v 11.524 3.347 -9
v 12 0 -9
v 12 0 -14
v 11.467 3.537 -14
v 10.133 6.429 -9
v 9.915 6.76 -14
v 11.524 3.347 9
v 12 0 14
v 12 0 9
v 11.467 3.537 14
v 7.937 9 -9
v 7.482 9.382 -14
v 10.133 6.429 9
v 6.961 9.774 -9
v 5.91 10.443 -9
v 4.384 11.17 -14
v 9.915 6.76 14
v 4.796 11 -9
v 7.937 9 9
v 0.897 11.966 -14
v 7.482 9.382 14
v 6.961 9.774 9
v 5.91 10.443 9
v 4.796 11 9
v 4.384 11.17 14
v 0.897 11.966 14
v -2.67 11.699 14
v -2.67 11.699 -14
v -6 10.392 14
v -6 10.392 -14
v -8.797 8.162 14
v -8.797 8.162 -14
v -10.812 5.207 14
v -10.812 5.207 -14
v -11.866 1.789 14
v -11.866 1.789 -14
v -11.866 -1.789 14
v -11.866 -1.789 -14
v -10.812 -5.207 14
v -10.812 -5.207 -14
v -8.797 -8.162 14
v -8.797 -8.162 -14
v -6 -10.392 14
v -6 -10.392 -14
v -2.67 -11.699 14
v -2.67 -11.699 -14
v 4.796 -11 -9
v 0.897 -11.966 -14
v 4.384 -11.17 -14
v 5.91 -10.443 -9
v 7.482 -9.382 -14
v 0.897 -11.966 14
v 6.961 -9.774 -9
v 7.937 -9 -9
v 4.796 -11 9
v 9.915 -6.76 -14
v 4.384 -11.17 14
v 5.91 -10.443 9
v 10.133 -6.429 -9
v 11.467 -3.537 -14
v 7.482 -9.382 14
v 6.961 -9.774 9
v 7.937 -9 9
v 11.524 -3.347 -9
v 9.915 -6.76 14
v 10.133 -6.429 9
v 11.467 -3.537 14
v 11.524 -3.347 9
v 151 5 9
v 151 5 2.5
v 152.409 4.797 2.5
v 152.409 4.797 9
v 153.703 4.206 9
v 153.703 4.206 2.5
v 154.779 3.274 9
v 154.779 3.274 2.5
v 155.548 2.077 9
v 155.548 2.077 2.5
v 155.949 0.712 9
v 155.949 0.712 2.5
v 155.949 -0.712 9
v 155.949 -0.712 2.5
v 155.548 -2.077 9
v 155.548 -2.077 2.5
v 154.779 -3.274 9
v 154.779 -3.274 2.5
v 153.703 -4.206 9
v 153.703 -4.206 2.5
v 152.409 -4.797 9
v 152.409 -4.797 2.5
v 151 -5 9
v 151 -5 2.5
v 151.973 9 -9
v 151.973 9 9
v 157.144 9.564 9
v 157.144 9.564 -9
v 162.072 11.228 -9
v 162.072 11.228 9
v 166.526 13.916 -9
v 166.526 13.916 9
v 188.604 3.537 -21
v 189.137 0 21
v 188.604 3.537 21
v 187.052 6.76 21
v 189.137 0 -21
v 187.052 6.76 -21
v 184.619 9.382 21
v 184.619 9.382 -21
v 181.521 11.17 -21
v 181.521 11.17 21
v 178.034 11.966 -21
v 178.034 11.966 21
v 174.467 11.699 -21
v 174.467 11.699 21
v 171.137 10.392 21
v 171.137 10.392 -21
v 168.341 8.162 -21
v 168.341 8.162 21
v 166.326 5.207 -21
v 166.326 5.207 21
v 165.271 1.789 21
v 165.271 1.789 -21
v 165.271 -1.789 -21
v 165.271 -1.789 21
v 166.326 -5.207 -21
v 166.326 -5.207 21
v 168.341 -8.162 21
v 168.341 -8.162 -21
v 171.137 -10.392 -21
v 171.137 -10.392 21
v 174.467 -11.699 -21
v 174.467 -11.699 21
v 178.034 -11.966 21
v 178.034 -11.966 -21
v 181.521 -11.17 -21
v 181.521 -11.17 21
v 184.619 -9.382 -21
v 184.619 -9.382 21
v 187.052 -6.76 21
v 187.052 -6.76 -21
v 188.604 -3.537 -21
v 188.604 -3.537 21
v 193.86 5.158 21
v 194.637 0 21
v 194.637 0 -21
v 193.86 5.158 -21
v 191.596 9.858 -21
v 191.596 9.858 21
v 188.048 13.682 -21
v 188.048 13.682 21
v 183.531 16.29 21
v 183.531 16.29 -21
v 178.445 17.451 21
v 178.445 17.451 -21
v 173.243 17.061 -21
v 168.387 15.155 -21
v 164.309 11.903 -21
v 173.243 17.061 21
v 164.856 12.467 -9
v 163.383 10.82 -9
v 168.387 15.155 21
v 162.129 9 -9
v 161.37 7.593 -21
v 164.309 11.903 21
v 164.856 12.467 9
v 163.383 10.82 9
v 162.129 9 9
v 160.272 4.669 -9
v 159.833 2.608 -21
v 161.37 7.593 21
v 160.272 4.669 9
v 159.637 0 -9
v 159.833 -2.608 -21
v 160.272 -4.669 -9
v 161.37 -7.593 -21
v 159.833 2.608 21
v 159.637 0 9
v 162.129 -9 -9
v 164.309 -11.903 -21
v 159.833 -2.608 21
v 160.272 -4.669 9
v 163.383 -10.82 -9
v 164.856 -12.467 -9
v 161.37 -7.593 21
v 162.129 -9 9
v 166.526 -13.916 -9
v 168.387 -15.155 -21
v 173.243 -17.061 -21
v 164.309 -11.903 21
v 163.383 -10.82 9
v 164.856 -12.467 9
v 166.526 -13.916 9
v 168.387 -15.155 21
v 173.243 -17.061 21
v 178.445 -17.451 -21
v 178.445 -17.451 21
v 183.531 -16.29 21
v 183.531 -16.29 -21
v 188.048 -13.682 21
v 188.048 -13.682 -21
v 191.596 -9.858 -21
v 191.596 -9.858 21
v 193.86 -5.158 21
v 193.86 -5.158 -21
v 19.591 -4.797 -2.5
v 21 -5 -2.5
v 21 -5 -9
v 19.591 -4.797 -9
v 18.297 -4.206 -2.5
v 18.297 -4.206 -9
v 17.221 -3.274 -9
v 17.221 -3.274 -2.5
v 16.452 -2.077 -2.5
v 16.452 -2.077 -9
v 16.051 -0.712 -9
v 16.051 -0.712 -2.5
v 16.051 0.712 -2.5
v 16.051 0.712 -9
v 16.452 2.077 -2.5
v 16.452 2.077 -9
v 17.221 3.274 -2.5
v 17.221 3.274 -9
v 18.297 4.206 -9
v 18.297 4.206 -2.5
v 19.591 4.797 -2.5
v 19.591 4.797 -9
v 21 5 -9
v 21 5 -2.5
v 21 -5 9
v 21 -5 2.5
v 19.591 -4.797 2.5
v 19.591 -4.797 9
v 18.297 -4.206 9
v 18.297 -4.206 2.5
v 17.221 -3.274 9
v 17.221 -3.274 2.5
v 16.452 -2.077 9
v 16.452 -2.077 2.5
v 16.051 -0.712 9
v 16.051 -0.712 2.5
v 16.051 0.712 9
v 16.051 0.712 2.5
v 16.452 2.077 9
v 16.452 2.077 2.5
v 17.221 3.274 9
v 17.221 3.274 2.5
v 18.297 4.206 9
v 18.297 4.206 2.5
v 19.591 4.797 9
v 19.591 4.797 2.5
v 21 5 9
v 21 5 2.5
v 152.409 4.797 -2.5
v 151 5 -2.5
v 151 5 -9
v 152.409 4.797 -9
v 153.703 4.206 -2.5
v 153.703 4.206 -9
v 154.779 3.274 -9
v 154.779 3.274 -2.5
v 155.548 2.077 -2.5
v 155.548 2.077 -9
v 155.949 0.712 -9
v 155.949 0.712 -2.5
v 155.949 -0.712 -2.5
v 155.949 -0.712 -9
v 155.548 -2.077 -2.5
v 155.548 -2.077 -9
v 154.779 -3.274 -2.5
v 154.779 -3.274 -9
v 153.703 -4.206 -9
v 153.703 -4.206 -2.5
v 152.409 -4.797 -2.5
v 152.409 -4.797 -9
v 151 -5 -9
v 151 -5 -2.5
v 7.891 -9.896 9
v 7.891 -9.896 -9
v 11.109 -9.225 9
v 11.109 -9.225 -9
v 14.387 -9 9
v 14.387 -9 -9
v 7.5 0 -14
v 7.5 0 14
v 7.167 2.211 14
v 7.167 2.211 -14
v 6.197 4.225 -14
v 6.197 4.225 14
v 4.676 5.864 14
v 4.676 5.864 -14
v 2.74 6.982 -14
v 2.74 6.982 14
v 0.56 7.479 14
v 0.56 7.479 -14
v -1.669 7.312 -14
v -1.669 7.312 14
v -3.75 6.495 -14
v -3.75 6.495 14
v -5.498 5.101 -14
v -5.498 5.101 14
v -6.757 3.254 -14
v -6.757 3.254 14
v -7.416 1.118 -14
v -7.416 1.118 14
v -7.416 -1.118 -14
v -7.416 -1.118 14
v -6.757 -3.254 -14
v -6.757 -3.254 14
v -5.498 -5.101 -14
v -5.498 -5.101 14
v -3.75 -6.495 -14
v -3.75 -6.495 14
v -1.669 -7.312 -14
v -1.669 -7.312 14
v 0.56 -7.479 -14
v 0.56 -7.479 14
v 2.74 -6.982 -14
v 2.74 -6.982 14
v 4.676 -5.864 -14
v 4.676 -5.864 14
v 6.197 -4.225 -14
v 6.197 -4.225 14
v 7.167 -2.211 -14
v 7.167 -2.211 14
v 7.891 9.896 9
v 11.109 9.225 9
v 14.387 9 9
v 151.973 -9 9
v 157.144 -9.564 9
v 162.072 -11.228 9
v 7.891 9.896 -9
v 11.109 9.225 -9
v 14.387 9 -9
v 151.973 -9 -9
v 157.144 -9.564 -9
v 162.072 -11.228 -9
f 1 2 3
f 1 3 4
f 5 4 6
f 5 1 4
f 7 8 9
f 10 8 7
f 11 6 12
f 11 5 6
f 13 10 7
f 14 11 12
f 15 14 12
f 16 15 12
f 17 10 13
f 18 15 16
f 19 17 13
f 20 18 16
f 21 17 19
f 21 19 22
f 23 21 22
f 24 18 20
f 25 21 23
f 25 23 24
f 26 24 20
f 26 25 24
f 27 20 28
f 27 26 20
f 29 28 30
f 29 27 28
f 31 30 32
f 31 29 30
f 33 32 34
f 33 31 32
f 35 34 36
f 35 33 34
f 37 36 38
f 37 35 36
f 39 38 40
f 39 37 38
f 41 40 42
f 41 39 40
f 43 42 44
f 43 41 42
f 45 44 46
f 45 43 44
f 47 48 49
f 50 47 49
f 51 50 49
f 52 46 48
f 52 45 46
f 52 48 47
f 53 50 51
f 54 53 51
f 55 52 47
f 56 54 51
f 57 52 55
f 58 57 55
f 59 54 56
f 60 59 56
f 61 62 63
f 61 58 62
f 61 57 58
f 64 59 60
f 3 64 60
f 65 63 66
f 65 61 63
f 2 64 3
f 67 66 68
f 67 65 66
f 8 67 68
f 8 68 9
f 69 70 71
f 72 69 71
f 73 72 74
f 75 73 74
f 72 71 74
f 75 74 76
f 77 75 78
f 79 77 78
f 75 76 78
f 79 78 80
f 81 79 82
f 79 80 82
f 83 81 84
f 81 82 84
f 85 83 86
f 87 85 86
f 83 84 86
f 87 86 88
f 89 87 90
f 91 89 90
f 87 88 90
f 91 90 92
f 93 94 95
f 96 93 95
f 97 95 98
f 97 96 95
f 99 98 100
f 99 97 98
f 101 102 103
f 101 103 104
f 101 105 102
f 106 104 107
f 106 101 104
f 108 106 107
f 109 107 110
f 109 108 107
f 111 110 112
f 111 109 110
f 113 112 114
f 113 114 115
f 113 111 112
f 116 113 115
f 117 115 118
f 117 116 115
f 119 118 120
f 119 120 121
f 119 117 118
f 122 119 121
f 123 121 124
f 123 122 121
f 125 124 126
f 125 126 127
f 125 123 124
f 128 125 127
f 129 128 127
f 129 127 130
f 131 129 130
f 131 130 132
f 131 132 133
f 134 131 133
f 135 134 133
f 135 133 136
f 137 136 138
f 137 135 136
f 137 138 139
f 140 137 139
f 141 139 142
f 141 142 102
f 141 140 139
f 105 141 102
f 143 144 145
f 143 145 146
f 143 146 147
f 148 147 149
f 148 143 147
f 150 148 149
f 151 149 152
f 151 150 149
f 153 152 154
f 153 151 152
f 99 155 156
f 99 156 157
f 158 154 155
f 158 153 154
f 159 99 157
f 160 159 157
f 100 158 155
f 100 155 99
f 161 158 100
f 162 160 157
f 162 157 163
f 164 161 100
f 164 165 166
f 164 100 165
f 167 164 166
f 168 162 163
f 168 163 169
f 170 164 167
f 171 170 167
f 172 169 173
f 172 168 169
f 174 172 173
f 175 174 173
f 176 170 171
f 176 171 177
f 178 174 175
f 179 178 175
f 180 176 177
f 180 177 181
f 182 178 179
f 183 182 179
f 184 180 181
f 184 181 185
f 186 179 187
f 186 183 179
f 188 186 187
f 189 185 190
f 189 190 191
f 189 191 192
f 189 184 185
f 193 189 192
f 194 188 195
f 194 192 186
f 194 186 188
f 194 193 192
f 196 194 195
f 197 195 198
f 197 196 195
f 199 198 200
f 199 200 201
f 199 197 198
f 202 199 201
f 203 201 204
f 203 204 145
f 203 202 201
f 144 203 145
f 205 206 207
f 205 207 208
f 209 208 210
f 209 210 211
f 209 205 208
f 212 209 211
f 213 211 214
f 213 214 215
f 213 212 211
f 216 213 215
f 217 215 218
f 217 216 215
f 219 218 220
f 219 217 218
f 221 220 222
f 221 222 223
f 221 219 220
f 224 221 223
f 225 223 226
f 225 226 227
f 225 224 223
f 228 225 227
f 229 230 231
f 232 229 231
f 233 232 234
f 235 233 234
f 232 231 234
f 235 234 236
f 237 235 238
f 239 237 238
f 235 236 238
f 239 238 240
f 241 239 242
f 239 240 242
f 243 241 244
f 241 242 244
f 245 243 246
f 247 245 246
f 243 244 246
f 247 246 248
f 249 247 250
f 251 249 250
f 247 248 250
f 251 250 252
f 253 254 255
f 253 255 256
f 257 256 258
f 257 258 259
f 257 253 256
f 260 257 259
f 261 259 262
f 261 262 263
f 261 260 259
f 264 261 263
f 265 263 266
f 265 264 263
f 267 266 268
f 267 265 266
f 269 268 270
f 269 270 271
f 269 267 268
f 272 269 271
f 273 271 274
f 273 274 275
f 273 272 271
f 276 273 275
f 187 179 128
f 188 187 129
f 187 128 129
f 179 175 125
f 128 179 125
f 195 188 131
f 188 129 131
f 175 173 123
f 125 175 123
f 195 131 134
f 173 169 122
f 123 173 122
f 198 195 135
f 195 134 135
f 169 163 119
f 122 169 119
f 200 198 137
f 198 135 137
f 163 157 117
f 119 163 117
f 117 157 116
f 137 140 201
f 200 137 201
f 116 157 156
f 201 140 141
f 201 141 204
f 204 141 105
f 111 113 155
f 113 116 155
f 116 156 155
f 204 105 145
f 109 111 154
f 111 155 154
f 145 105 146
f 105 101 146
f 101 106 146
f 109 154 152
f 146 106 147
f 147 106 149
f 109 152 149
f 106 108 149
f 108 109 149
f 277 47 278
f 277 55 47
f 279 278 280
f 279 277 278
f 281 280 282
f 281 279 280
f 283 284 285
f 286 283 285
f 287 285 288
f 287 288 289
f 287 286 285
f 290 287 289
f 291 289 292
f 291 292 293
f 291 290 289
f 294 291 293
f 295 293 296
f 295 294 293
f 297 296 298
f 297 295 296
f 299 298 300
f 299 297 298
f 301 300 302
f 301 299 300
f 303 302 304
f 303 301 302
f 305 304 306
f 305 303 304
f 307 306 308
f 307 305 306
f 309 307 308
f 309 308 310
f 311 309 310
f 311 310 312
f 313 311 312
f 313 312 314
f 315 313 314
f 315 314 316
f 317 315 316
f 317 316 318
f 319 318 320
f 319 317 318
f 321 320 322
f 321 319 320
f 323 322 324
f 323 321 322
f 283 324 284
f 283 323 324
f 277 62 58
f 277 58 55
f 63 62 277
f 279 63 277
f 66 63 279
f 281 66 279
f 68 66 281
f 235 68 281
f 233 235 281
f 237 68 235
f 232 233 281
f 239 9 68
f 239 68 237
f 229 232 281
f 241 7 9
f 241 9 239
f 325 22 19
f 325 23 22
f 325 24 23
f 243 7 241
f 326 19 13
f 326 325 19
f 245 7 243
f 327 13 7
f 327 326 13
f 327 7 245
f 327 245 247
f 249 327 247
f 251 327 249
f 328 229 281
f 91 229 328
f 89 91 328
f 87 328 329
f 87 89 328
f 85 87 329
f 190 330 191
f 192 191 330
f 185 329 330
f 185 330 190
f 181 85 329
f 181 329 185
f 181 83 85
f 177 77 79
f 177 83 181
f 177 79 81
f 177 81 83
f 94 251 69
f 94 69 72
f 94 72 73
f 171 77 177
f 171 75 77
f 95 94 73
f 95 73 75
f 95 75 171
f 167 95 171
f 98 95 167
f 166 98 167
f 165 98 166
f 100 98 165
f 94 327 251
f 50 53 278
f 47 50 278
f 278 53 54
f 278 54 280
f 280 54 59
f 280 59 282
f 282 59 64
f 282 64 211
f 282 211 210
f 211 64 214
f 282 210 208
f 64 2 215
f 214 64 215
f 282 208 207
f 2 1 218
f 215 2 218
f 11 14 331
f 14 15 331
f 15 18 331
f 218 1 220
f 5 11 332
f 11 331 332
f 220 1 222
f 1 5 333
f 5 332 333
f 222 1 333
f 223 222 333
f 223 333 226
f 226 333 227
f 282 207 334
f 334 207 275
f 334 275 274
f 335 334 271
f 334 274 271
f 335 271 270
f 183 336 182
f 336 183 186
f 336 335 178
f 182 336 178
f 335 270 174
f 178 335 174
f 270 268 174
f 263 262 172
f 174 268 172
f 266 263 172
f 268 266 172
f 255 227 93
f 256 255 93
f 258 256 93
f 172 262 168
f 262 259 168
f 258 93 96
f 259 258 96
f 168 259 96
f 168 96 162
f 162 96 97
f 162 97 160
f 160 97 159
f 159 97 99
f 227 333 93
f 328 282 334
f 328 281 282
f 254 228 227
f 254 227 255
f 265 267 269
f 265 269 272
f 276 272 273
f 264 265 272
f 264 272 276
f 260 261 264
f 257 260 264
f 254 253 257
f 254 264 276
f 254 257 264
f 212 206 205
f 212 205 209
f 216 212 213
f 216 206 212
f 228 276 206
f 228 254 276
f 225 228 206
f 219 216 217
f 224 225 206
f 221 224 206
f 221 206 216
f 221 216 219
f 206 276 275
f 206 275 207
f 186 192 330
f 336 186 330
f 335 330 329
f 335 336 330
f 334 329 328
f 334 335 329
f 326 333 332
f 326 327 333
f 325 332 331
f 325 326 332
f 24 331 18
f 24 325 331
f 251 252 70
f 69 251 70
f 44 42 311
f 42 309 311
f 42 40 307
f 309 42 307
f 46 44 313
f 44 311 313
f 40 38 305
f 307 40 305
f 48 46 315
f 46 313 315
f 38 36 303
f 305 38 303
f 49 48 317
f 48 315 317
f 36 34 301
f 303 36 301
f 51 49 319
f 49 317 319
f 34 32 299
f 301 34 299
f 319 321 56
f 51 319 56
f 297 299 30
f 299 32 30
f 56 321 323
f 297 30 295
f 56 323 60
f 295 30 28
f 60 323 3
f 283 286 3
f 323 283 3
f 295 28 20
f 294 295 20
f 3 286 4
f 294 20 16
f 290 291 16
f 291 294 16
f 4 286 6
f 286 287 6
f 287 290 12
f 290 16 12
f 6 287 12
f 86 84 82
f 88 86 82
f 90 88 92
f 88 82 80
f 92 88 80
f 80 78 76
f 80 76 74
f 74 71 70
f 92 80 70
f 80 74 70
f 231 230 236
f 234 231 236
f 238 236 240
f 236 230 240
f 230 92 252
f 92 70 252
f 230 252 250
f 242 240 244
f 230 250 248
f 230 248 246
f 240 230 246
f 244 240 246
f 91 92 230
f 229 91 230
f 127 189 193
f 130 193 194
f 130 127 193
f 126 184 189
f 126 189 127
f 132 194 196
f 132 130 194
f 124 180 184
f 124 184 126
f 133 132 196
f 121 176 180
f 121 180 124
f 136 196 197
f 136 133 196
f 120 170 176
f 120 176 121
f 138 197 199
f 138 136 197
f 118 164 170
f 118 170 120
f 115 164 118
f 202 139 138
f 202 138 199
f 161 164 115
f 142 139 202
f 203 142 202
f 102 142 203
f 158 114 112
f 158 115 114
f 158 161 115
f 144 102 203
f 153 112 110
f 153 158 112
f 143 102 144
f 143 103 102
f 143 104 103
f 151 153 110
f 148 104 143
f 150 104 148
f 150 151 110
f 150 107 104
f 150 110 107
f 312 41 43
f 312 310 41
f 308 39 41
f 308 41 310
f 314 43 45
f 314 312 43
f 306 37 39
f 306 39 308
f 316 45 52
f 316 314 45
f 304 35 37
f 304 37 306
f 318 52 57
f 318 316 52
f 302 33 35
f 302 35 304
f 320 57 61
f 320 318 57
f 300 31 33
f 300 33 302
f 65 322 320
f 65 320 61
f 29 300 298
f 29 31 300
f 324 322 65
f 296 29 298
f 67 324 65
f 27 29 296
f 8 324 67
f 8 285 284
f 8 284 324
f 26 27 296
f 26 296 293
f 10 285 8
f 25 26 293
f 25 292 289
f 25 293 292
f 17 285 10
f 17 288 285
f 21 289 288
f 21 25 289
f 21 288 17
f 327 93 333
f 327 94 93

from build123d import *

# Parameters (mm, degrees)
SKETCH1_R           = 12
SKETCH1_R_2         = 7.5
BOSS_EXTRUDE1_DEPTH = 14
SKETCH1_5_R         = 17.5
SKETCH1_5_R_2       = 12
BOSS_EXTRUDE3_DEPTH = 21
BOSS_EXTRUDE4_DEPTH = 9
CUT_EXTRUDE3_START  = 2.5
CUT_EXTRUDE3_DEPTH  = 6.5
FILLET1_R           = 24


with BuildPart() as part:
    # Sketch1 → Boss-Extrude1 (new body, symmetric)
    with BuildSketch(Plane.XY):
        Circle(SKETCH1_R)
        Circle(SKETCH1_R_2, mode=Mode.SUBTRACT)
    extrude(amount=BOSS_EXTRUDE1_DEPTH, both=True)



with BuildPart() as body_2:
    # Sketch1<5> → Boss-Extrude3 (new body, symmetric)
    with BuildSketch(Plane.XY):
        with Locations((177.137212096, 0)):
            Circle(SKETCH1_5_R)
        with Locations((177.137212096, 0)):
            Circle(SKETCH1_5_R_2, mode=Mode.SUBTRACT)
    extrude(amount=BOSS_EXTRUDE3_DEPTH, both=True)


with BuildPart() as part_1:
    add(part.part)

    add(body_2.part)  # Boss-Extrude4 merges body 2
    # Sketch1<6> → Boss-Extrude4 (add, symmetric)
    with BuildSketch(Plane.XY):
        with BuildLine():
            Line((162.128881076, 9), (7.937253933, 9))
            ThreePointArc((7.937253933, 9), (10.937253933, 4.937253933), (12, 0))
            ThreePointArc((12, 0), (10.937253933, -4.937253933), (7.937253933, -9))
            Line((7.937253933, -9), (162.128881076, -9))
            ThreePointArc((162.128881076, -9), (159.637212096, 0), (162.128881076, 9))
        make_face()
    extrude(amount=BOSS_EXTRUDE4_DEPTH, both=True)

    # Sketch2 → Cut-Extrude3 (cut)
    with BuildSketch(Plane.XY.offset(CUT_EXTRUDE3_START)):
        with BuildLine():
            Line((21, 5), (151, 5))
            ThreePointArc((151, 5), (156, 0), (151, -5))
            Line((151, -5), (21, -5))
            ThreePointArc((21, -5), (16, 0), (21, 5))
        make_face()
    cut_extrude3 = extrude(amount=CUT_EXTRUDE3_DEPTH, mode=Mode.SUBTRACT)

    # Mirror1: Cut-Extrude3 across plane
    add(cut_extrude3.mirror(Plane.XY), mode=Mode.SUBTRACT)

    # Fillet1
    fillet1_edges = [part_1.edges().sort_by_distance(p)[0] for p in [
        (7.937253933, 9, 0),
        (7.937253933, -9, 0),
        (162.128881076, -9, 0),
        (162.128881076, 9, 0),
    ]]
    fillet(fillet1_edges, radius=FILLET1_R)


solid = part_1.part
